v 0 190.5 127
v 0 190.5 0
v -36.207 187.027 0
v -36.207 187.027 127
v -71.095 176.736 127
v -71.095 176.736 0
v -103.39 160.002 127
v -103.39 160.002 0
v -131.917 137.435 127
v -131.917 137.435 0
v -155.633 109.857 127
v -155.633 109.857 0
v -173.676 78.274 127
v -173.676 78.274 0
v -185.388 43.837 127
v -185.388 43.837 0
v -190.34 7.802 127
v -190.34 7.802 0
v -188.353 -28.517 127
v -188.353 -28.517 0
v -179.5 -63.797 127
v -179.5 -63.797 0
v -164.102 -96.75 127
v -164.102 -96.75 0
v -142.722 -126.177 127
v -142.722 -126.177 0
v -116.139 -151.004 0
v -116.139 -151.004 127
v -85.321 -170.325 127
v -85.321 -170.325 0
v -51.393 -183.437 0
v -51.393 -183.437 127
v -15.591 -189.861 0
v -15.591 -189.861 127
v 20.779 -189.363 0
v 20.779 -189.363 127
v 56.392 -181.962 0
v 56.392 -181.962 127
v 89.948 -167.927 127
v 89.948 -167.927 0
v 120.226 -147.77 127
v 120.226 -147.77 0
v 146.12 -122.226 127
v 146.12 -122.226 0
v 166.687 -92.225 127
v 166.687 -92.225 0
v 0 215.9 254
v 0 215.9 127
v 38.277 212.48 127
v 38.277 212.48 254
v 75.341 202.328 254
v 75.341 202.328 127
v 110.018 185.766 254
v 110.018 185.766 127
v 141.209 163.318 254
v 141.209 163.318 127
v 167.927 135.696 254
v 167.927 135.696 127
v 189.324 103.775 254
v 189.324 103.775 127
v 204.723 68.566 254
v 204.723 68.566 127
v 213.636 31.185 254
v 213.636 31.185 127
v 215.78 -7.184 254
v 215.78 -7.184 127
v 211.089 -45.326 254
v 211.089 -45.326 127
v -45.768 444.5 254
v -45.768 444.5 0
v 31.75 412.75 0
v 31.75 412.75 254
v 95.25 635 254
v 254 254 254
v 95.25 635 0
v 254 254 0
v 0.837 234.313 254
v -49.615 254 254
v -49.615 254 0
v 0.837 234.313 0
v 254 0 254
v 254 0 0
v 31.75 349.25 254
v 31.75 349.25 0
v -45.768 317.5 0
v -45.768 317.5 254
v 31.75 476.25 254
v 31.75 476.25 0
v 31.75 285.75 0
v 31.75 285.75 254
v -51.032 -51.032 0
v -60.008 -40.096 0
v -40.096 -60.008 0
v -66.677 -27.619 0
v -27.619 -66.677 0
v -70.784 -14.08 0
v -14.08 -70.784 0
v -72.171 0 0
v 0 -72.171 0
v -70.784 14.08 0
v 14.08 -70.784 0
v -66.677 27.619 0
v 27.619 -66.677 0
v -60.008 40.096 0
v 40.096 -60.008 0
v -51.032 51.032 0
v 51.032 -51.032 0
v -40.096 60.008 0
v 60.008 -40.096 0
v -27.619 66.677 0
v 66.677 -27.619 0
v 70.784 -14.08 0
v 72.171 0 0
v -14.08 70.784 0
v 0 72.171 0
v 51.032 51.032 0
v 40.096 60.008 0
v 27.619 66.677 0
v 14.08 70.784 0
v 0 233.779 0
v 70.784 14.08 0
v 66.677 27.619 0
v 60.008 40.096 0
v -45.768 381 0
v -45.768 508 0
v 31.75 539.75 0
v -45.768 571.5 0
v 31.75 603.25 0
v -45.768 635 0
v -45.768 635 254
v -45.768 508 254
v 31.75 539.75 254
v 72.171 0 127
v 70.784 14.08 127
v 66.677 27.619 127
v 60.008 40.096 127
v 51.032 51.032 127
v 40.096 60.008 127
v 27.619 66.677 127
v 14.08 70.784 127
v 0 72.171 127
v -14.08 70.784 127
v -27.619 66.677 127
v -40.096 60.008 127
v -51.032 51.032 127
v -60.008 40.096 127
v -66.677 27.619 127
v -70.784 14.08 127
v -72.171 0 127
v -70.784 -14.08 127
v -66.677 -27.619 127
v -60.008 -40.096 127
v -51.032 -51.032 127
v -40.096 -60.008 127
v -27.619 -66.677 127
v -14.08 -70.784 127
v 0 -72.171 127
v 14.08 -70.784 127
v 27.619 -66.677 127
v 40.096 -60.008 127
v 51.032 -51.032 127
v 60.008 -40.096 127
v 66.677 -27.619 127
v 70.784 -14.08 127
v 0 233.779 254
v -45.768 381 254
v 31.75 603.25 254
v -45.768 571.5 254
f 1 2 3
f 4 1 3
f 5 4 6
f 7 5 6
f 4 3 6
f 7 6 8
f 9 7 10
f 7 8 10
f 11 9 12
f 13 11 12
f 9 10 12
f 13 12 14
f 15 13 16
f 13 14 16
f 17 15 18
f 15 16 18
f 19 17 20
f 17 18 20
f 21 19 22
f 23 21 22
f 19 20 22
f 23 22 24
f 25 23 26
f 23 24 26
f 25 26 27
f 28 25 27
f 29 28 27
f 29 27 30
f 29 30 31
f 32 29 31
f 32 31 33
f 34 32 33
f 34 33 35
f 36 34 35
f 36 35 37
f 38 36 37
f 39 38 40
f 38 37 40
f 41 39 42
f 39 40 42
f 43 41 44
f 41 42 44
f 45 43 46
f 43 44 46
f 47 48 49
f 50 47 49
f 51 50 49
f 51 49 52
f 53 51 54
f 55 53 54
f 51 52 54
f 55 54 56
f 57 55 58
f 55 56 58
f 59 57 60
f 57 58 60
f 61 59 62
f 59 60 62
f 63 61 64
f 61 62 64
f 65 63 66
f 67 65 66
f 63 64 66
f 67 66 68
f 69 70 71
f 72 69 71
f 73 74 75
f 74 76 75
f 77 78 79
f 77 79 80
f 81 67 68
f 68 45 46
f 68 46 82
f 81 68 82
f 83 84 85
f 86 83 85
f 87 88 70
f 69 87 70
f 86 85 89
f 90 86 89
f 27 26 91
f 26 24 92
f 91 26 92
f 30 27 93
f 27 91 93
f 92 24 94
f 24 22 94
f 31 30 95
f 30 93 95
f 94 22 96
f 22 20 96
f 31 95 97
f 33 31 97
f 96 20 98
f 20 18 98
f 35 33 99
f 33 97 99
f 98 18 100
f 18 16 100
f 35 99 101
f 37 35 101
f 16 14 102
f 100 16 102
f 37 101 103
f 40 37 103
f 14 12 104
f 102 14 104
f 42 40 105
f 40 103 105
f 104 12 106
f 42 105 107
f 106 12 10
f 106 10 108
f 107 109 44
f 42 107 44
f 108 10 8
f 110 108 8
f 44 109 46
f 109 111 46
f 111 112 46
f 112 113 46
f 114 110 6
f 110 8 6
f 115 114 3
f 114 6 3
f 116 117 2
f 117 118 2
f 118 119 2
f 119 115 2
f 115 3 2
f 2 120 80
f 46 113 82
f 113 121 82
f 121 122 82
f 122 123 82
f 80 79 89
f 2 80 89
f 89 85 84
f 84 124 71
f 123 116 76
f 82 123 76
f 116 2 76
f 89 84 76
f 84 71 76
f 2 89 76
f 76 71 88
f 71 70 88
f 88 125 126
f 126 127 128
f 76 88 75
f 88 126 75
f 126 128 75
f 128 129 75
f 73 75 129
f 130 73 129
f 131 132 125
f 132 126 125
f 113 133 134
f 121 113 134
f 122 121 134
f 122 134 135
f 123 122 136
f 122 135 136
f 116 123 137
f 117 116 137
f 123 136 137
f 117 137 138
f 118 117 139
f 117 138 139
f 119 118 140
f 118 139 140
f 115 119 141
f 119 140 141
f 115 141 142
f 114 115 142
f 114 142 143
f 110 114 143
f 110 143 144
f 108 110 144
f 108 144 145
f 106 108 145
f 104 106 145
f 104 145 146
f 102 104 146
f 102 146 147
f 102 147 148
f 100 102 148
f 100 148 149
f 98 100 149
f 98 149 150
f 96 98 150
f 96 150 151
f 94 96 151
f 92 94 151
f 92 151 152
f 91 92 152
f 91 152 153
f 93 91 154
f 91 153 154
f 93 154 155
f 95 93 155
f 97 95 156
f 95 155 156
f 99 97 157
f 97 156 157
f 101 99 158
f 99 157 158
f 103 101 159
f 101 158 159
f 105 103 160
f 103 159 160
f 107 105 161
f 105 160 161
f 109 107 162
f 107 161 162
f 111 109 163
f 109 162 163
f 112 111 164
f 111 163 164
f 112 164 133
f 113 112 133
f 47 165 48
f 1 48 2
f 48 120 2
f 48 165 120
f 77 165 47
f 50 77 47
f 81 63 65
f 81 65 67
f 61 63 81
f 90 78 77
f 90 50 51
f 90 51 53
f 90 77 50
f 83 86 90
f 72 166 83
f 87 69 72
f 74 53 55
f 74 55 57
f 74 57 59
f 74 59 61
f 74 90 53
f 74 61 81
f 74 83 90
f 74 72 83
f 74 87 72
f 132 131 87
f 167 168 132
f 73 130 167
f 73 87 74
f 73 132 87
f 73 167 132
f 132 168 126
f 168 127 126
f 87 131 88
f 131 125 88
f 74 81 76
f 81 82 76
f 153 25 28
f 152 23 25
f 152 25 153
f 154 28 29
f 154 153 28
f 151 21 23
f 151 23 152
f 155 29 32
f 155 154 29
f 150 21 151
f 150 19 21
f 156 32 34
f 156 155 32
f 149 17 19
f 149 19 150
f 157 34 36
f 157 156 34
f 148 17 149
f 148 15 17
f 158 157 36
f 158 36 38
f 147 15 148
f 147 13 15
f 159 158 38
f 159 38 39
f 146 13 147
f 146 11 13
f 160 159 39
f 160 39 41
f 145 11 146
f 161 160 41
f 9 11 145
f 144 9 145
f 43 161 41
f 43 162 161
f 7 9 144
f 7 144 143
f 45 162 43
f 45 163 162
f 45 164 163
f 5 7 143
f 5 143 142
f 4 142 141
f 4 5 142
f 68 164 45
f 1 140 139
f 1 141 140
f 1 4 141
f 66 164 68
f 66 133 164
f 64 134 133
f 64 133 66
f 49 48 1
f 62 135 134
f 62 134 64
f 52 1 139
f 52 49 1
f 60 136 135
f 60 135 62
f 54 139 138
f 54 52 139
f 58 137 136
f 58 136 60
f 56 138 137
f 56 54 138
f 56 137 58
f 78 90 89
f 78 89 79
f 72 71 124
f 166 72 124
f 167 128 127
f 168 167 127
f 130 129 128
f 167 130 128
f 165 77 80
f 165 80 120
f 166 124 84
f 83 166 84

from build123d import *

# Parameters (mm, degrees)
F1_DEPTH      = 127
F3_DEPTH      = 127
F5_DEPTH      = 127
F5_DEPTH_BACK = 127
F6_R          = 72.1706207076
F7_DEPTH      = 266.7


with BuildPart() as f1:
    # F0 (on Top) → F1 (new body)
    with BuildSketch(Plane.XY):
        with BuildLine():
            Line((0, 233.7793111801), (0, 190.5))
            ThreePointArc((0, 190.5), (-164.1023944599, -96.7504735519), (166.6875, -92.2254159316))
            Line((166.6875, -92.2254159316), (254, 0))
            Line((254, 0), (254, 254))
            Line((254, 254), (95.25, 635))
            Line((95.25, 635), (31.75, 635))
            Line((31.75, 635), (31.75, 254))
            Line((31.75, 254), (0, 233.7793111801))
        make_face()
    extrude(amount=F1_DEPTH)

    # F2 (on face) → F3 (join)
    with BuildSketch(Plane.XY.offset(127)):
        with BuildLine():
            ThreePointArc((0, 215.9), (167.9266235199, 135.696201543), (211.0885127336, -45.3260387846))
            Line((211.0885127336, -45.3260387846), (254, 0))
            Line((254, 0), (254, 254))
            Line((254, 254), (95.25, 635))
            Line((95.25, 635), (31.75, 635))
            Line((31.75, 635), (31.75, 254))
            Line((31.75, 254), (0, 233.7793111801))
            Line((0, 233.7793111801), (0, 215.9))
        make_face()
    extrude(amount=F3_DEPTH)

    # F4 (on face) → F5 (join, two sides)
    with BuildSketch(Plane.XY.offset(127)) as f5_sk:
        Polygon((31.75, 539.75), (31.75, 603.25), (-45.7682893979, 571.5), align=None)
        Polygon((31.75, 254.0089488029), (31.75, 285.75), (-49.6154587908, 254), (31.75, 222.25), align=None)
        Polygon((31.75, 285.75), (31.75, 349.25), (-45.7682893979, 317.5), align=None)
        Polygon((31.75, 349.25), (31.75, 412.75), (-45.7682893979, 381), align=None)
        Polygon((31.75, 412.75), (31.75, 476.25), (-45.7682893979, 444.5), align=None)
        Polygon((31.75, 476.25), (31.75, 539.75), (-45.7682893979, 508), align=None)
        Polygon((-45.7682893979, 635), (31.75, 603.25), (31.75, 635), align=None)
    extrude(amount=-F5_DEPTH)
    extrude(f5_sk.sketch, amount=F5_DEPTH_BACK)

    # F6 (on face) → F7 (cut)
    with BuildSketch(Plane.XY.offset(127)):
        Circle(F6_R)
    extrude(amount=-F7_DEPTH, mode=Mode.SUBTRACT)


solid = f1.part
